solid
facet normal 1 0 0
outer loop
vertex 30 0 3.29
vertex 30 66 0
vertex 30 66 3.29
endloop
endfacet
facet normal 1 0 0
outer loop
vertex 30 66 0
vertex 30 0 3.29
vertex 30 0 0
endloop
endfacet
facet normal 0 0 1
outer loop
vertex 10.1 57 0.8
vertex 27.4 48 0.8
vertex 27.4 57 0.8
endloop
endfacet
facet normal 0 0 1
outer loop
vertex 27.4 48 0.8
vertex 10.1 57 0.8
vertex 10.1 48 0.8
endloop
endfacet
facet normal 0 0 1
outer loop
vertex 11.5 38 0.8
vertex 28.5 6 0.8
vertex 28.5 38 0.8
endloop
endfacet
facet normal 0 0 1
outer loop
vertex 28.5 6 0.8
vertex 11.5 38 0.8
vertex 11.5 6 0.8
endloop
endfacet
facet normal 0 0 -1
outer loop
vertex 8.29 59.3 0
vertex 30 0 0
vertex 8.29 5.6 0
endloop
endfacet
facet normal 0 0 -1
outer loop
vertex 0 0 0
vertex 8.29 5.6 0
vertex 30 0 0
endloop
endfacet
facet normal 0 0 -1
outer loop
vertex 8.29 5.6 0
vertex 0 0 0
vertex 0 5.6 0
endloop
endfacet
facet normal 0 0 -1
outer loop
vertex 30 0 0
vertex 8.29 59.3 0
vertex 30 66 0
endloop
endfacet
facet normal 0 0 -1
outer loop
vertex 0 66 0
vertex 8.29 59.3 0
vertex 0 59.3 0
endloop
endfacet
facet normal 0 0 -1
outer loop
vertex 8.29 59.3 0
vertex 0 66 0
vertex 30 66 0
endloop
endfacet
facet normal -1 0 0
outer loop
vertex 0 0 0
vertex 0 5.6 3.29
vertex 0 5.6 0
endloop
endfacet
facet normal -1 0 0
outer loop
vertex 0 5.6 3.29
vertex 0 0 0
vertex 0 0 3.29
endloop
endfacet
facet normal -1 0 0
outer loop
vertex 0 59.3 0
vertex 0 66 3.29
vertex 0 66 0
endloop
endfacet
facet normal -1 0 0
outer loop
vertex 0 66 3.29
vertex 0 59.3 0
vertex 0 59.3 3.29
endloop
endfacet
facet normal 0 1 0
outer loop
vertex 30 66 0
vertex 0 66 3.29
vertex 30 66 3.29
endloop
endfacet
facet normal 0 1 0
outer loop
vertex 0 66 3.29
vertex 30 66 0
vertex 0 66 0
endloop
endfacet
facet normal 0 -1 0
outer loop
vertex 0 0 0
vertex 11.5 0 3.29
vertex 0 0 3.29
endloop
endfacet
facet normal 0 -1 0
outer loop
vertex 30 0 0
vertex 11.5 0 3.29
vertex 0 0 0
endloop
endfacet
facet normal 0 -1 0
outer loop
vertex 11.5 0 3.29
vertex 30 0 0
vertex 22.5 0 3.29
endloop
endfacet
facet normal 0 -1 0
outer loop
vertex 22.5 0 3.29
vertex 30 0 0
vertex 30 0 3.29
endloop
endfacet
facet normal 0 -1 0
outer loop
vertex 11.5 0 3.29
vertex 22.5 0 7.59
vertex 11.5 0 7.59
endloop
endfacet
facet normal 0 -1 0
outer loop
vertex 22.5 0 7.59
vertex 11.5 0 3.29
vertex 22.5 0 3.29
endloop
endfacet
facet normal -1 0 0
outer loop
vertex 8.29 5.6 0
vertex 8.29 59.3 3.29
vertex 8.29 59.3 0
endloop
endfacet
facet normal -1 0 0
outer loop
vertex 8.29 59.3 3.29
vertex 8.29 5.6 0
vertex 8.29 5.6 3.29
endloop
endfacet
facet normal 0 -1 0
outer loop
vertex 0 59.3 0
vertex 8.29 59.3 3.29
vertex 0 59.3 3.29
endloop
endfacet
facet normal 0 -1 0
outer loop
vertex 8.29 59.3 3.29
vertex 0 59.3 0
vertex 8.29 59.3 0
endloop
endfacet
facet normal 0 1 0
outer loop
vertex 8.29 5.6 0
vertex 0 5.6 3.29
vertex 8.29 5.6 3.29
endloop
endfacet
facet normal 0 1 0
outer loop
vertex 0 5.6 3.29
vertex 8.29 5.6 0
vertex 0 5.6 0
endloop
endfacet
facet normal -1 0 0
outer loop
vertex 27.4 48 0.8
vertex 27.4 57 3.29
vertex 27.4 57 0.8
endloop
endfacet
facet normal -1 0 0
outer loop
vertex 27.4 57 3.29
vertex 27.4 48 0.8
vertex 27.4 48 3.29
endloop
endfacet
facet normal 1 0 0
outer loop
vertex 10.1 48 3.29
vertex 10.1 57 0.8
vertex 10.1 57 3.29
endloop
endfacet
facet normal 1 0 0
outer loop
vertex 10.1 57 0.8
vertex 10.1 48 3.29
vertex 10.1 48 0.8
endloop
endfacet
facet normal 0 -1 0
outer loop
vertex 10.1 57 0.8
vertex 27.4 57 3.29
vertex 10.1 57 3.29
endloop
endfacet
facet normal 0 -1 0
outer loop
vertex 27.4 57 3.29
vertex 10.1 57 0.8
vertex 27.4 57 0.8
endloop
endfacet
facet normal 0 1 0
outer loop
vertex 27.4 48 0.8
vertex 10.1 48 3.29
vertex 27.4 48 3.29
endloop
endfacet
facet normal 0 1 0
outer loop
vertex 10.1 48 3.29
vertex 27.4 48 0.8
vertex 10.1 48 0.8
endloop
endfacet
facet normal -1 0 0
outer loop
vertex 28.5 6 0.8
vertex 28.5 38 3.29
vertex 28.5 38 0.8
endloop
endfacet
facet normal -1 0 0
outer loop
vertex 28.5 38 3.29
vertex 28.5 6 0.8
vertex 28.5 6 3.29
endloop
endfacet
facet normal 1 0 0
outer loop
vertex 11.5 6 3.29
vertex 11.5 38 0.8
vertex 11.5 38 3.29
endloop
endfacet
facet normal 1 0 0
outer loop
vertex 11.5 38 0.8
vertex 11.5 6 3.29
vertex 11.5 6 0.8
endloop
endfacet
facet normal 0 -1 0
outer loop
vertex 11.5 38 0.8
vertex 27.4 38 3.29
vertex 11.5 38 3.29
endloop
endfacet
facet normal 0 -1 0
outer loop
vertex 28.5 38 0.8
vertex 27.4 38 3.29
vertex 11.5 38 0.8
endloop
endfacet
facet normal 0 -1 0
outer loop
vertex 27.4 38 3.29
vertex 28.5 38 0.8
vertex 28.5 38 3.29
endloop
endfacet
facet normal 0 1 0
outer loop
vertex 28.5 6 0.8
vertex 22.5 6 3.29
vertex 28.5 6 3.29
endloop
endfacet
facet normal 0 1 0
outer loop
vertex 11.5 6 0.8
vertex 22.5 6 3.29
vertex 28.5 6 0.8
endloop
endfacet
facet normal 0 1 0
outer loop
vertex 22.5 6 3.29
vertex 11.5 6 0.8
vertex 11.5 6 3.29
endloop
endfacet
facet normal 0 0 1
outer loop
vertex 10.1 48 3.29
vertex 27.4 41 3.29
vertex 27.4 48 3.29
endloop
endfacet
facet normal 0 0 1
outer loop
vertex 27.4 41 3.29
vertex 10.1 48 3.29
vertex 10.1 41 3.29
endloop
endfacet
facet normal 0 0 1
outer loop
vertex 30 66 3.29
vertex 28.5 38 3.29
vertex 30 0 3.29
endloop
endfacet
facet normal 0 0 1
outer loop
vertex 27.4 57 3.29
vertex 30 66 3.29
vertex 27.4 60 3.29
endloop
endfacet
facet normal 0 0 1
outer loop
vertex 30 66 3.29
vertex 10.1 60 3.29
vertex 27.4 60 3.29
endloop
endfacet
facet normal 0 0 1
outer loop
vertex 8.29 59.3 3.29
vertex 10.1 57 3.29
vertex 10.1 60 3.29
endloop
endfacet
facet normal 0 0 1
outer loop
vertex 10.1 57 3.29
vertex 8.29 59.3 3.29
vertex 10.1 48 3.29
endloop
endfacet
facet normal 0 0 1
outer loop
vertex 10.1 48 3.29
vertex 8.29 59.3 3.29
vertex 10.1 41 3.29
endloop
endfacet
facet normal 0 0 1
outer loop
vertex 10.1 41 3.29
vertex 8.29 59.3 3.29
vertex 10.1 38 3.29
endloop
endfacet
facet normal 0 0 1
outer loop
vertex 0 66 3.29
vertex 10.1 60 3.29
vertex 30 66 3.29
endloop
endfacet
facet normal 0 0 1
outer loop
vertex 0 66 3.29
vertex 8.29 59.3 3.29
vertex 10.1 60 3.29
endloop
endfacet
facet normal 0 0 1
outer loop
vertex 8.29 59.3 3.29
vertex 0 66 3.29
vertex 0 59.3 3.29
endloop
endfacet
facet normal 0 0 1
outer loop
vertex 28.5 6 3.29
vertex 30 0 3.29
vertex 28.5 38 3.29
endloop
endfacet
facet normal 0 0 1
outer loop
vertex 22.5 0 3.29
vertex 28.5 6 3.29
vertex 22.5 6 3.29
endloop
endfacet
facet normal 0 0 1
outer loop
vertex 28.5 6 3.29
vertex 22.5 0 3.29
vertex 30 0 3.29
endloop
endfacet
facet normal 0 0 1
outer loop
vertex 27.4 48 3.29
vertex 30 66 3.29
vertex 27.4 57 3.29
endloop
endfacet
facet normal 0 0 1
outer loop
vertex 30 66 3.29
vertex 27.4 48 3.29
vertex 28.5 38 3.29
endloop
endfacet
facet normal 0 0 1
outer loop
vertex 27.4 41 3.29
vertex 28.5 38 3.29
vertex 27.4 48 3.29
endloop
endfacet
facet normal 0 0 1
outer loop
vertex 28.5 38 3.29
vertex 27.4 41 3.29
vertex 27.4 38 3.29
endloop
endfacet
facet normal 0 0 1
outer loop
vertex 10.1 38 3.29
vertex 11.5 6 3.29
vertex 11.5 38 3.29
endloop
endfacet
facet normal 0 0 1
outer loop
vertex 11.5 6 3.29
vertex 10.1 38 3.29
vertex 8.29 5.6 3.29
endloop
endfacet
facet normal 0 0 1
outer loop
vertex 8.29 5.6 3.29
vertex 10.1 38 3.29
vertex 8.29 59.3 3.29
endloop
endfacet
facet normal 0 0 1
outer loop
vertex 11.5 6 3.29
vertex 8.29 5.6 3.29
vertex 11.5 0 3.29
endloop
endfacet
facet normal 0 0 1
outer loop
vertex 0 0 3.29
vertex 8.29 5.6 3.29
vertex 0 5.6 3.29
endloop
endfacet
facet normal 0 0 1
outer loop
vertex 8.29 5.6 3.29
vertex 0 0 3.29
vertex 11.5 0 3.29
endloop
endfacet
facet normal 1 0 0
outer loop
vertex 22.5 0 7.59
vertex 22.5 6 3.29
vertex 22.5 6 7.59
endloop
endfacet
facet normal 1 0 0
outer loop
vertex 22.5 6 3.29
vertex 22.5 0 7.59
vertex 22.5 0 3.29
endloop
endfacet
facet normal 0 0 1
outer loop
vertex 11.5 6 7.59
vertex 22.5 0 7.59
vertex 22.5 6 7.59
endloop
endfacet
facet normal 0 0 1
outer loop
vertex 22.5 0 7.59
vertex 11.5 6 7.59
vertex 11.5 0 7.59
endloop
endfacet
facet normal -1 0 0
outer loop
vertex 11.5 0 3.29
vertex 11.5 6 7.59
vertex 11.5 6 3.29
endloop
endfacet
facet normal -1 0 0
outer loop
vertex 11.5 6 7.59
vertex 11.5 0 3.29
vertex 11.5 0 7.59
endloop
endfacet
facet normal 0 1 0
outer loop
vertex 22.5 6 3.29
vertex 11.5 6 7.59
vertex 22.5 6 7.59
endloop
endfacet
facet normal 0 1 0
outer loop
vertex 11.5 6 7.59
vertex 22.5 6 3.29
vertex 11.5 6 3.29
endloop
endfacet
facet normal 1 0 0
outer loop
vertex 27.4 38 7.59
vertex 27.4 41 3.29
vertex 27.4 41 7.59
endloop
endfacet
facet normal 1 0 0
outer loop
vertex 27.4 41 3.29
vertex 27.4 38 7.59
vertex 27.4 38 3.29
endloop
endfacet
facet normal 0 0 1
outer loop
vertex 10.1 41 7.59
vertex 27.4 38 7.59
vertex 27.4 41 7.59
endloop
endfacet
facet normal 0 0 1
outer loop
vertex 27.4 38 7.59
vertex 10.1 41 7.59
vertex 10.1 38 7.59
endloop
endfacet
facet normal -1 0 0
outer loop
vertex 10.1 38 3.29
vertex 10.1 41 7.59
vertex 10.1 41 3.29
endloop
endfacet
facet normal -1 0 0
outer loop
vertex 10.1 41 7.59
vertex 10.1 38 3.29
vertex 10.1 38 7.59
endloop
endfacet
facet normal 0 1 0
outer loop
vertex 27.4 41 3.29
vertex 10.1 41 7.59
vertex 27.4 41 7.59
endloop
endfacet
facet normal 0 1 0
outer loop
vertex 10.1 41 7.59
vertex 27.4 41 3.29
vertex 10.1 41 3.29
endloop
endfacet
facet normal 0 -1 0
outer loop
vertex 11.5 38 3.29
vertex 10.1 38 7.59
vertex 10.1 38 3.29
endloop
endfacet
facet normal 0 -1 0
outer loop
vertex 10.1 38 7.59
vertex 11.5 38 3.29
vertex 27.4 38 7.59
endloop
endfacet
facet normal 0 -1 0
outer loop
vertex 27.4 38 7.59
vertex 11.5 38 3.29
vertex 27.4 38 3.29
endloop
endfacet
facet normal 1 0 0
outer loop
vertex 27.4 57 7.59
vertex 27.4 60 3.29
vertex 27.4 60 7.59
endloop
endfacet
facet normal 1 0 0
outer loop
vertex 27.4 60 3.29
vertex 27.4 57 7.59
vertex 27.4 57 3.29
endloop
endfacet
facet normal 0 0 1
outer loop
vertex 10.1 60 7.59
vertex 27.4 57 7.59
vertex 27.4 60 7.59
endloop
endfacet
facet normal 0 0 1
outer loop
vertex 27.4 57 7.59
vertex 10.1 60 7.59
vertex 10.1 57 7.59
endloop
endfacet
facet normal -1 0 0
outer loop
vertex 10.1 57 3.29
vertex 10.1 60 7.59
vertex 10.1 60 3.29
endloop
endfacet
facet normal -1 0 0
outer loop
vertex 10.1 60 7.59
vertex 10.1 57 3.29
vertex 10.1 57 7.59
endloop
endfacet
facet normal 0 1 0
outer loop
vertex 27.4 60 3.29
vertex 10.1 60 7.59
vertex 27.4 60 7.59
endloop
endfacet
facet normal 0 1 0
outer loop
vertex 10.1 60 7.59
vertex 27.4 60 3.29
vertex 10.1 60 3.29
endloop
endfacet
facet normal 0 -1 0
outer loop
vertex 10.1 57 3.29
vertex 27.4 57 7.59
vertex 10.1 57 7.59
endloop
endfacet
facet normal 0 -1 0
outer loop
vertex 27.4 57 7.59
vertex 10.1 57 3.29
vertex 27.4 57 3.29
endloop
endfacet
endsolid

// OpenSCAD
rpi_w = 30;
rpi_l = 66;

gpio_cutout_w = 8.3;
gpio_cutout_l = 53.7;
gpio_offset_x = -0.01;
gpio_offset_y = 5.6;

lirc_cutout_w = 17.3;
lirc_cutout_l = 9;
lirc_offset_x = 10.1;
lirc_offset_y = 48;

soundcard_cutout_w = 17;
soundcard_cutout_l = 32;
soundcard_offset_x = 11.5;
soundcard_offset_y = 6;

$fn=100;

union() {
  // layer 1 (ground)
  ground_thickness = 0.8;
  difference() {
    cube([rpi_w, rpi_l, ground_thickness]);

    translate([0, 0, -0.1])
    scale([1, 1, 2]) {
      translate([gpio_offset_x, gpio_offset_y, 0])
      cube([gpio_cutout_w, gpio_cutout_l, ground_thickness]);
    }
  }

  // layer 2 (sinks)
  sinks_thickness = 2.5;
  translate([0,0,ground_thickness-0.01])
  difference() {
    cube([rpi_w, rpi_l, sinks_thickness]);

    translate([0, 0, -0.1])
    scale([1, 1, 2]) {
      translate([gpio_offset_x, gpio_offset_y, 0])
      cube([gpio_cutout_w, gpio_cutout_l, sinks_thickness]);

      translate([lirc_offset_x, lirc_offset_y, 0])
      cube([lirc_cutout_w, lirc_cutout_l, sinks_thickness]);

      translate([soundcard_offset_x, soundcard_offset_y, 0])
      cube([soundcard_cutout_w, soundcard_cutout_l, sinks_thickness]);
    }
  }

  translate([0,0,ground_thickness+sinks_thickness-0.01])
  union() {
    translate([soundcard_offset_x, 0, 0])
    cube([soundcard_cutout_w-6, soundcard_offset_y, 4.3]);

    translate([lirc_offset_x, soundcard_offset_y+soundcard_cutout_l, 0])
    cube([lirc_cutout_w, 3, 4.3]);

    translate([lirc_offset_x, lirc_offset_y+lirc_cutout_l, 0])
    cube([lirc_cutout_w, 3, 4.3]);
  }
}
